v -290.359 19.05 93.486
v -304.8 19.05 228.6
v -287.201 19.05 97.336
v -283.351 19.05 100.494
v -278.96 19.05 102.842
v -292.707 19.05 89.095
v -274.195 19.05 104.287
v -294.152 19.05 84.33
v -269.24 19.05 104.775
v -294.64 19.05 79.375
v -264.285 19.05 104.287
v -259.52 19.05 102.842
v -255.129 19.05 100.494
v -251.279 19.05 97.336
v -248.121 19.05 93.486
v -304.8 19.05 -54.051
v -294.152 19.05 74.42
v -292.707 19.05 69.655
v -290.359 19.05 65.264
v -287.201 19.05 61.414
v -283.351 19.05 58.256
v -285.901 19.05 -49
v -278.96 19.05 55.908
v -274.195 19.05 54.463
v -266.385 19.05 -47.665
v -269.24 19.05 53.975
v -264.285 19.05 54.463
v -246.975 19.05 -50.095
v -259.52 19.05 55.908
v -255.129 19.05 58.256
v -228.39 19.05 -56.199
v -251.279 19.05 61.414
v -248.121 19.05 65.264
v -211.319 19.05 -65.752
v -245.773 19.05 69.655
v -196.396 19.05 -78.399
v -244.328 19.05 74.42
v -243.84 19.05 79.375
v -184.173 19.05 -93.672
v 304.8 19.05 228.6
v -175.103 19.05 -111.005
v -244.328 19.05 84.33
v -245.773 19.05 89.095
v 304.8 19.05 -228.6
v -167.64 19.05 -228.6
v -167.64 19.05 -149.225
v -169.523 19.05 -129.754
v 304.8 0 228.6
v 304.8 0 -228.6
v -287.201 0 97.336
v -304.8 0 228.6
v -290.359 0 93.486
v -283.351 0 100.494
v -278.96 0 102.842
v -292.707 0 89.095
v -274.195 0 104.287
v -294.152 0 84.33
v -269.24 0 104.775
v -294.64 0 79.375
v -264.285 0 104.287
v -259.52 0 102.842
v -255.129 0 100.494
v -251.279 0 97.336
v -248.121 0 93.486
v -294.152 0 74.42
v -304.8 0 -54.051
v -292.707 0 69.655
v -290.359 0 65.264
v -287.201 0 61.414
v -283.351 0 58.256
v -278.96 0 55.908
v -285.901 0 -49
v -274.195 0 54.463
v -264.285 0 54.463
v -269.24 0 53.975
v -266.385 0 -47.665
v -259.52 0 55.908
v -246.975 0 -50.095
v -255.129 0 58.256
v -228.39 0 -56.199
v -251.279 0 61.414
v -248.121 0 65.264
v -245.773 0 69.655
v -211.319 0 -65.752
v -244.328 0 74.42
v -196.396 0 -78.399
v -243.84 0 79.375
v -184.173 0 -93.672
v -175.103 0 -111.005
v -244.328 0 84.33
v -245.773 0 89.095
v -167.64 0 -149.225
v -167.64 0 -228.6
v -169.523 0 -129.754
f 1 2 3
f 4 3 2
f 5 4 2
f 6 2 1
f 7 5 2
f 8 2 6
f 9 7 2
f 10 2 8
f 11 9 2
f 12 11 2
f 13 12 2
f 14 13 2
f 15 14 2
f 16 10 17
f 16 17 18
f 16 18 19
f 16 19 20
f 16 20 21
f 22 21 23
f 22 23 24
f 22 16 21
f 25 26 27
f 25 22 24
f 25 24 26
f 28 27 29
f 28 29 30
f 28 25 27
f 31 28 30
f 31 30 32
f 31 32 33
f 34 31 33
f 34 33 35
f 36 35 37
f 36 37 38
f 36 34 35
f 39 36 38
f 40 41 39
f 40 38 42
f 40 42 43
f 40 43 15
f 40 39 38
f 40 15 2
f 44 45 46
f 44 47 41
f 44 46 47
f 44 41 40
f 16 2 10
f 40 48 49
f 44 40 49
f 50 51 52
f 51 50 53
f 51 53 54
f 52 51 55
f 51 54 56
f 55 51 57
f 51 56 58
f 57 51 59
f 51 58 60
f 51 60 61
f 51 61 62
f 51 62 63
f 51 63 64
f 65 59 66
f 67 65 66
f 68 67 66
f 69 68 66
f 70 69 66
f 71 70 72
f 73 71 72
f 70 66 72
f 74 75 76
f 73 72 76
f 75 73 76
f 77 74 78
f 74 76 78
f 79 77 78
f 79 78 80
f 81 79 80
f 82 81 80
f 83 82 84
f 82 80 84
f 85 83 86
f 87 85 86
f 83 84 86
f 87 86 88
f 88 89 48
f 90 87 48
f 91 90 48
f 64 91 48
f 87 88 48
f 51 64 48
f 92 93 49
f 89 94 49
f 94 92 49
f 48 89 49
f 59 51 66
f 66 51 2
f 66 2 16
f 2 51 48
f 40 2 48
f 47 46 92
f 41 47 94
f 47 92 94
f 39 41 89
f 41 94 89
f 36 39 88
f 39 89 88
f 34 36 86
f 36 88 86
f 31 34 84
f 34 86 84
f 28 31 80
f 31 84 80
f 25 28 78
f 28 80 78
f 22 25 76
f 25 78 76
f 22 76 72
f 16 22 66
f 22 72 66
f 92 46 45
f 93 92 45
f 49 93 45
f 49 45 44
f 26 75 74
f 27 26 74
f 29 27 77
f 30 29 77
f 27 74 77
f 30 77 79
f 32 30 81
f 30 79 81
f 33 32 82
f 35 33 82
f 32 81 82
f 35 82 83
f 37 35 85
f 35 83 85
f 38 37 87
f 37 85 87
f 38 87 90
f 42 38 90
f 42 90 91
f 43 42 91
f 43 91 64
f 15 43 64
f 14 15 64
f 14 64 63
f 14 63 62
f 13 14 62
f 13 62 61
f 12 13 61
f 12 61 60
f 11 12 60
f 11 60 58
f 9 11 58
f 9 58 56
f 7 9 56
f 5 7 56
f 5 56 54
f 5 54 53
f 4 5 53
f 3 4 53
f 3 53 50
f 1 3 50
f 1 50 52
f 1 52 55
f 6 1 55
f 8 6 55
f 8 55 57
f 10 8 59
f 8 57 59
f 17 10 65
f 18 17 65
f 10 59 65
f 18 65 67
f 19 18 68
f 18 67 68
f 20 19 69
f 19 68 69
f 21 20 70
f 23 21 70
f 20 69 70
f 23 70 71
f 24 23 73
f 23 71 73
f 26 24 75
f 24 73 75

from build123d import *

# Parameters (mm, degrees)
SKETCH1_W           = 609.6
SKETCH1_H           = 457.2
BOSS_EXTRUDE1_DEPTH = 19.05
SKETCH2_R           = 25.4
CUT_EXTRUDE1_DEPTH  = 382.475952715
SKETCH4_R           = 101.6
CUT_EXTRUDE2_DEPTH  = 382.475952715
SKETCH6_W           = 137.16
SKETCH6_H           = 79.375
CUT_EXTRUDE3_DEPTH  = 382.475952715


with BuildPart() as part:
    # Sketch1 → Boss-Extrude1 (new body)
    with BuildSketch(Plane(origin=(0, 0, 0), x_dir=(1, 0, 0), z_dir=(0, 1, 0))):
        Rectangle(SKETCH1_W, SKETCH1_H)
    extrude(amount=BOSS_EXTRUDE1_DEPTH)

    # Sketch2 → Cut-Extrude1 (cut, through all)
    with BuildSketch(Plane.XZ):
        with Locations(Location((-269.24, 79.375, 0), (0, 0, 270))):
            Circle(SKETCH2_R)
    extrude(amount=-CUT_EXTRUDE1_DEPTH, mode=Mode.SUBTRACT)

    # Sketch4 → Cut-Extrude2 (cut, through all)
    with BuildSketch(Plane.XZ):
        with Locations((-269.24, -149.225)):
            Circle(SKETCH4_R)
    extrude(amount=-CUT_EXTRUDE2_DEPTH, mode=Mode.SUBTRACT)

    # Sketch6 → Cut-Extrude3 (cut, through all)
    with BuildSketch(Plane(origin=(0, 19.05, 0), x_dir=(1, 0, 0), z_dir=(0, 1, 0))):
        with Locations((-236.22, 188.9125)):
            Rectangle(SKETCH6_W, SKETCH6_H)
    extrude(amount=-CUT_EXTRUDE3_DEPTH, mode=Mode.SUBTRACT)


solid = part.part
